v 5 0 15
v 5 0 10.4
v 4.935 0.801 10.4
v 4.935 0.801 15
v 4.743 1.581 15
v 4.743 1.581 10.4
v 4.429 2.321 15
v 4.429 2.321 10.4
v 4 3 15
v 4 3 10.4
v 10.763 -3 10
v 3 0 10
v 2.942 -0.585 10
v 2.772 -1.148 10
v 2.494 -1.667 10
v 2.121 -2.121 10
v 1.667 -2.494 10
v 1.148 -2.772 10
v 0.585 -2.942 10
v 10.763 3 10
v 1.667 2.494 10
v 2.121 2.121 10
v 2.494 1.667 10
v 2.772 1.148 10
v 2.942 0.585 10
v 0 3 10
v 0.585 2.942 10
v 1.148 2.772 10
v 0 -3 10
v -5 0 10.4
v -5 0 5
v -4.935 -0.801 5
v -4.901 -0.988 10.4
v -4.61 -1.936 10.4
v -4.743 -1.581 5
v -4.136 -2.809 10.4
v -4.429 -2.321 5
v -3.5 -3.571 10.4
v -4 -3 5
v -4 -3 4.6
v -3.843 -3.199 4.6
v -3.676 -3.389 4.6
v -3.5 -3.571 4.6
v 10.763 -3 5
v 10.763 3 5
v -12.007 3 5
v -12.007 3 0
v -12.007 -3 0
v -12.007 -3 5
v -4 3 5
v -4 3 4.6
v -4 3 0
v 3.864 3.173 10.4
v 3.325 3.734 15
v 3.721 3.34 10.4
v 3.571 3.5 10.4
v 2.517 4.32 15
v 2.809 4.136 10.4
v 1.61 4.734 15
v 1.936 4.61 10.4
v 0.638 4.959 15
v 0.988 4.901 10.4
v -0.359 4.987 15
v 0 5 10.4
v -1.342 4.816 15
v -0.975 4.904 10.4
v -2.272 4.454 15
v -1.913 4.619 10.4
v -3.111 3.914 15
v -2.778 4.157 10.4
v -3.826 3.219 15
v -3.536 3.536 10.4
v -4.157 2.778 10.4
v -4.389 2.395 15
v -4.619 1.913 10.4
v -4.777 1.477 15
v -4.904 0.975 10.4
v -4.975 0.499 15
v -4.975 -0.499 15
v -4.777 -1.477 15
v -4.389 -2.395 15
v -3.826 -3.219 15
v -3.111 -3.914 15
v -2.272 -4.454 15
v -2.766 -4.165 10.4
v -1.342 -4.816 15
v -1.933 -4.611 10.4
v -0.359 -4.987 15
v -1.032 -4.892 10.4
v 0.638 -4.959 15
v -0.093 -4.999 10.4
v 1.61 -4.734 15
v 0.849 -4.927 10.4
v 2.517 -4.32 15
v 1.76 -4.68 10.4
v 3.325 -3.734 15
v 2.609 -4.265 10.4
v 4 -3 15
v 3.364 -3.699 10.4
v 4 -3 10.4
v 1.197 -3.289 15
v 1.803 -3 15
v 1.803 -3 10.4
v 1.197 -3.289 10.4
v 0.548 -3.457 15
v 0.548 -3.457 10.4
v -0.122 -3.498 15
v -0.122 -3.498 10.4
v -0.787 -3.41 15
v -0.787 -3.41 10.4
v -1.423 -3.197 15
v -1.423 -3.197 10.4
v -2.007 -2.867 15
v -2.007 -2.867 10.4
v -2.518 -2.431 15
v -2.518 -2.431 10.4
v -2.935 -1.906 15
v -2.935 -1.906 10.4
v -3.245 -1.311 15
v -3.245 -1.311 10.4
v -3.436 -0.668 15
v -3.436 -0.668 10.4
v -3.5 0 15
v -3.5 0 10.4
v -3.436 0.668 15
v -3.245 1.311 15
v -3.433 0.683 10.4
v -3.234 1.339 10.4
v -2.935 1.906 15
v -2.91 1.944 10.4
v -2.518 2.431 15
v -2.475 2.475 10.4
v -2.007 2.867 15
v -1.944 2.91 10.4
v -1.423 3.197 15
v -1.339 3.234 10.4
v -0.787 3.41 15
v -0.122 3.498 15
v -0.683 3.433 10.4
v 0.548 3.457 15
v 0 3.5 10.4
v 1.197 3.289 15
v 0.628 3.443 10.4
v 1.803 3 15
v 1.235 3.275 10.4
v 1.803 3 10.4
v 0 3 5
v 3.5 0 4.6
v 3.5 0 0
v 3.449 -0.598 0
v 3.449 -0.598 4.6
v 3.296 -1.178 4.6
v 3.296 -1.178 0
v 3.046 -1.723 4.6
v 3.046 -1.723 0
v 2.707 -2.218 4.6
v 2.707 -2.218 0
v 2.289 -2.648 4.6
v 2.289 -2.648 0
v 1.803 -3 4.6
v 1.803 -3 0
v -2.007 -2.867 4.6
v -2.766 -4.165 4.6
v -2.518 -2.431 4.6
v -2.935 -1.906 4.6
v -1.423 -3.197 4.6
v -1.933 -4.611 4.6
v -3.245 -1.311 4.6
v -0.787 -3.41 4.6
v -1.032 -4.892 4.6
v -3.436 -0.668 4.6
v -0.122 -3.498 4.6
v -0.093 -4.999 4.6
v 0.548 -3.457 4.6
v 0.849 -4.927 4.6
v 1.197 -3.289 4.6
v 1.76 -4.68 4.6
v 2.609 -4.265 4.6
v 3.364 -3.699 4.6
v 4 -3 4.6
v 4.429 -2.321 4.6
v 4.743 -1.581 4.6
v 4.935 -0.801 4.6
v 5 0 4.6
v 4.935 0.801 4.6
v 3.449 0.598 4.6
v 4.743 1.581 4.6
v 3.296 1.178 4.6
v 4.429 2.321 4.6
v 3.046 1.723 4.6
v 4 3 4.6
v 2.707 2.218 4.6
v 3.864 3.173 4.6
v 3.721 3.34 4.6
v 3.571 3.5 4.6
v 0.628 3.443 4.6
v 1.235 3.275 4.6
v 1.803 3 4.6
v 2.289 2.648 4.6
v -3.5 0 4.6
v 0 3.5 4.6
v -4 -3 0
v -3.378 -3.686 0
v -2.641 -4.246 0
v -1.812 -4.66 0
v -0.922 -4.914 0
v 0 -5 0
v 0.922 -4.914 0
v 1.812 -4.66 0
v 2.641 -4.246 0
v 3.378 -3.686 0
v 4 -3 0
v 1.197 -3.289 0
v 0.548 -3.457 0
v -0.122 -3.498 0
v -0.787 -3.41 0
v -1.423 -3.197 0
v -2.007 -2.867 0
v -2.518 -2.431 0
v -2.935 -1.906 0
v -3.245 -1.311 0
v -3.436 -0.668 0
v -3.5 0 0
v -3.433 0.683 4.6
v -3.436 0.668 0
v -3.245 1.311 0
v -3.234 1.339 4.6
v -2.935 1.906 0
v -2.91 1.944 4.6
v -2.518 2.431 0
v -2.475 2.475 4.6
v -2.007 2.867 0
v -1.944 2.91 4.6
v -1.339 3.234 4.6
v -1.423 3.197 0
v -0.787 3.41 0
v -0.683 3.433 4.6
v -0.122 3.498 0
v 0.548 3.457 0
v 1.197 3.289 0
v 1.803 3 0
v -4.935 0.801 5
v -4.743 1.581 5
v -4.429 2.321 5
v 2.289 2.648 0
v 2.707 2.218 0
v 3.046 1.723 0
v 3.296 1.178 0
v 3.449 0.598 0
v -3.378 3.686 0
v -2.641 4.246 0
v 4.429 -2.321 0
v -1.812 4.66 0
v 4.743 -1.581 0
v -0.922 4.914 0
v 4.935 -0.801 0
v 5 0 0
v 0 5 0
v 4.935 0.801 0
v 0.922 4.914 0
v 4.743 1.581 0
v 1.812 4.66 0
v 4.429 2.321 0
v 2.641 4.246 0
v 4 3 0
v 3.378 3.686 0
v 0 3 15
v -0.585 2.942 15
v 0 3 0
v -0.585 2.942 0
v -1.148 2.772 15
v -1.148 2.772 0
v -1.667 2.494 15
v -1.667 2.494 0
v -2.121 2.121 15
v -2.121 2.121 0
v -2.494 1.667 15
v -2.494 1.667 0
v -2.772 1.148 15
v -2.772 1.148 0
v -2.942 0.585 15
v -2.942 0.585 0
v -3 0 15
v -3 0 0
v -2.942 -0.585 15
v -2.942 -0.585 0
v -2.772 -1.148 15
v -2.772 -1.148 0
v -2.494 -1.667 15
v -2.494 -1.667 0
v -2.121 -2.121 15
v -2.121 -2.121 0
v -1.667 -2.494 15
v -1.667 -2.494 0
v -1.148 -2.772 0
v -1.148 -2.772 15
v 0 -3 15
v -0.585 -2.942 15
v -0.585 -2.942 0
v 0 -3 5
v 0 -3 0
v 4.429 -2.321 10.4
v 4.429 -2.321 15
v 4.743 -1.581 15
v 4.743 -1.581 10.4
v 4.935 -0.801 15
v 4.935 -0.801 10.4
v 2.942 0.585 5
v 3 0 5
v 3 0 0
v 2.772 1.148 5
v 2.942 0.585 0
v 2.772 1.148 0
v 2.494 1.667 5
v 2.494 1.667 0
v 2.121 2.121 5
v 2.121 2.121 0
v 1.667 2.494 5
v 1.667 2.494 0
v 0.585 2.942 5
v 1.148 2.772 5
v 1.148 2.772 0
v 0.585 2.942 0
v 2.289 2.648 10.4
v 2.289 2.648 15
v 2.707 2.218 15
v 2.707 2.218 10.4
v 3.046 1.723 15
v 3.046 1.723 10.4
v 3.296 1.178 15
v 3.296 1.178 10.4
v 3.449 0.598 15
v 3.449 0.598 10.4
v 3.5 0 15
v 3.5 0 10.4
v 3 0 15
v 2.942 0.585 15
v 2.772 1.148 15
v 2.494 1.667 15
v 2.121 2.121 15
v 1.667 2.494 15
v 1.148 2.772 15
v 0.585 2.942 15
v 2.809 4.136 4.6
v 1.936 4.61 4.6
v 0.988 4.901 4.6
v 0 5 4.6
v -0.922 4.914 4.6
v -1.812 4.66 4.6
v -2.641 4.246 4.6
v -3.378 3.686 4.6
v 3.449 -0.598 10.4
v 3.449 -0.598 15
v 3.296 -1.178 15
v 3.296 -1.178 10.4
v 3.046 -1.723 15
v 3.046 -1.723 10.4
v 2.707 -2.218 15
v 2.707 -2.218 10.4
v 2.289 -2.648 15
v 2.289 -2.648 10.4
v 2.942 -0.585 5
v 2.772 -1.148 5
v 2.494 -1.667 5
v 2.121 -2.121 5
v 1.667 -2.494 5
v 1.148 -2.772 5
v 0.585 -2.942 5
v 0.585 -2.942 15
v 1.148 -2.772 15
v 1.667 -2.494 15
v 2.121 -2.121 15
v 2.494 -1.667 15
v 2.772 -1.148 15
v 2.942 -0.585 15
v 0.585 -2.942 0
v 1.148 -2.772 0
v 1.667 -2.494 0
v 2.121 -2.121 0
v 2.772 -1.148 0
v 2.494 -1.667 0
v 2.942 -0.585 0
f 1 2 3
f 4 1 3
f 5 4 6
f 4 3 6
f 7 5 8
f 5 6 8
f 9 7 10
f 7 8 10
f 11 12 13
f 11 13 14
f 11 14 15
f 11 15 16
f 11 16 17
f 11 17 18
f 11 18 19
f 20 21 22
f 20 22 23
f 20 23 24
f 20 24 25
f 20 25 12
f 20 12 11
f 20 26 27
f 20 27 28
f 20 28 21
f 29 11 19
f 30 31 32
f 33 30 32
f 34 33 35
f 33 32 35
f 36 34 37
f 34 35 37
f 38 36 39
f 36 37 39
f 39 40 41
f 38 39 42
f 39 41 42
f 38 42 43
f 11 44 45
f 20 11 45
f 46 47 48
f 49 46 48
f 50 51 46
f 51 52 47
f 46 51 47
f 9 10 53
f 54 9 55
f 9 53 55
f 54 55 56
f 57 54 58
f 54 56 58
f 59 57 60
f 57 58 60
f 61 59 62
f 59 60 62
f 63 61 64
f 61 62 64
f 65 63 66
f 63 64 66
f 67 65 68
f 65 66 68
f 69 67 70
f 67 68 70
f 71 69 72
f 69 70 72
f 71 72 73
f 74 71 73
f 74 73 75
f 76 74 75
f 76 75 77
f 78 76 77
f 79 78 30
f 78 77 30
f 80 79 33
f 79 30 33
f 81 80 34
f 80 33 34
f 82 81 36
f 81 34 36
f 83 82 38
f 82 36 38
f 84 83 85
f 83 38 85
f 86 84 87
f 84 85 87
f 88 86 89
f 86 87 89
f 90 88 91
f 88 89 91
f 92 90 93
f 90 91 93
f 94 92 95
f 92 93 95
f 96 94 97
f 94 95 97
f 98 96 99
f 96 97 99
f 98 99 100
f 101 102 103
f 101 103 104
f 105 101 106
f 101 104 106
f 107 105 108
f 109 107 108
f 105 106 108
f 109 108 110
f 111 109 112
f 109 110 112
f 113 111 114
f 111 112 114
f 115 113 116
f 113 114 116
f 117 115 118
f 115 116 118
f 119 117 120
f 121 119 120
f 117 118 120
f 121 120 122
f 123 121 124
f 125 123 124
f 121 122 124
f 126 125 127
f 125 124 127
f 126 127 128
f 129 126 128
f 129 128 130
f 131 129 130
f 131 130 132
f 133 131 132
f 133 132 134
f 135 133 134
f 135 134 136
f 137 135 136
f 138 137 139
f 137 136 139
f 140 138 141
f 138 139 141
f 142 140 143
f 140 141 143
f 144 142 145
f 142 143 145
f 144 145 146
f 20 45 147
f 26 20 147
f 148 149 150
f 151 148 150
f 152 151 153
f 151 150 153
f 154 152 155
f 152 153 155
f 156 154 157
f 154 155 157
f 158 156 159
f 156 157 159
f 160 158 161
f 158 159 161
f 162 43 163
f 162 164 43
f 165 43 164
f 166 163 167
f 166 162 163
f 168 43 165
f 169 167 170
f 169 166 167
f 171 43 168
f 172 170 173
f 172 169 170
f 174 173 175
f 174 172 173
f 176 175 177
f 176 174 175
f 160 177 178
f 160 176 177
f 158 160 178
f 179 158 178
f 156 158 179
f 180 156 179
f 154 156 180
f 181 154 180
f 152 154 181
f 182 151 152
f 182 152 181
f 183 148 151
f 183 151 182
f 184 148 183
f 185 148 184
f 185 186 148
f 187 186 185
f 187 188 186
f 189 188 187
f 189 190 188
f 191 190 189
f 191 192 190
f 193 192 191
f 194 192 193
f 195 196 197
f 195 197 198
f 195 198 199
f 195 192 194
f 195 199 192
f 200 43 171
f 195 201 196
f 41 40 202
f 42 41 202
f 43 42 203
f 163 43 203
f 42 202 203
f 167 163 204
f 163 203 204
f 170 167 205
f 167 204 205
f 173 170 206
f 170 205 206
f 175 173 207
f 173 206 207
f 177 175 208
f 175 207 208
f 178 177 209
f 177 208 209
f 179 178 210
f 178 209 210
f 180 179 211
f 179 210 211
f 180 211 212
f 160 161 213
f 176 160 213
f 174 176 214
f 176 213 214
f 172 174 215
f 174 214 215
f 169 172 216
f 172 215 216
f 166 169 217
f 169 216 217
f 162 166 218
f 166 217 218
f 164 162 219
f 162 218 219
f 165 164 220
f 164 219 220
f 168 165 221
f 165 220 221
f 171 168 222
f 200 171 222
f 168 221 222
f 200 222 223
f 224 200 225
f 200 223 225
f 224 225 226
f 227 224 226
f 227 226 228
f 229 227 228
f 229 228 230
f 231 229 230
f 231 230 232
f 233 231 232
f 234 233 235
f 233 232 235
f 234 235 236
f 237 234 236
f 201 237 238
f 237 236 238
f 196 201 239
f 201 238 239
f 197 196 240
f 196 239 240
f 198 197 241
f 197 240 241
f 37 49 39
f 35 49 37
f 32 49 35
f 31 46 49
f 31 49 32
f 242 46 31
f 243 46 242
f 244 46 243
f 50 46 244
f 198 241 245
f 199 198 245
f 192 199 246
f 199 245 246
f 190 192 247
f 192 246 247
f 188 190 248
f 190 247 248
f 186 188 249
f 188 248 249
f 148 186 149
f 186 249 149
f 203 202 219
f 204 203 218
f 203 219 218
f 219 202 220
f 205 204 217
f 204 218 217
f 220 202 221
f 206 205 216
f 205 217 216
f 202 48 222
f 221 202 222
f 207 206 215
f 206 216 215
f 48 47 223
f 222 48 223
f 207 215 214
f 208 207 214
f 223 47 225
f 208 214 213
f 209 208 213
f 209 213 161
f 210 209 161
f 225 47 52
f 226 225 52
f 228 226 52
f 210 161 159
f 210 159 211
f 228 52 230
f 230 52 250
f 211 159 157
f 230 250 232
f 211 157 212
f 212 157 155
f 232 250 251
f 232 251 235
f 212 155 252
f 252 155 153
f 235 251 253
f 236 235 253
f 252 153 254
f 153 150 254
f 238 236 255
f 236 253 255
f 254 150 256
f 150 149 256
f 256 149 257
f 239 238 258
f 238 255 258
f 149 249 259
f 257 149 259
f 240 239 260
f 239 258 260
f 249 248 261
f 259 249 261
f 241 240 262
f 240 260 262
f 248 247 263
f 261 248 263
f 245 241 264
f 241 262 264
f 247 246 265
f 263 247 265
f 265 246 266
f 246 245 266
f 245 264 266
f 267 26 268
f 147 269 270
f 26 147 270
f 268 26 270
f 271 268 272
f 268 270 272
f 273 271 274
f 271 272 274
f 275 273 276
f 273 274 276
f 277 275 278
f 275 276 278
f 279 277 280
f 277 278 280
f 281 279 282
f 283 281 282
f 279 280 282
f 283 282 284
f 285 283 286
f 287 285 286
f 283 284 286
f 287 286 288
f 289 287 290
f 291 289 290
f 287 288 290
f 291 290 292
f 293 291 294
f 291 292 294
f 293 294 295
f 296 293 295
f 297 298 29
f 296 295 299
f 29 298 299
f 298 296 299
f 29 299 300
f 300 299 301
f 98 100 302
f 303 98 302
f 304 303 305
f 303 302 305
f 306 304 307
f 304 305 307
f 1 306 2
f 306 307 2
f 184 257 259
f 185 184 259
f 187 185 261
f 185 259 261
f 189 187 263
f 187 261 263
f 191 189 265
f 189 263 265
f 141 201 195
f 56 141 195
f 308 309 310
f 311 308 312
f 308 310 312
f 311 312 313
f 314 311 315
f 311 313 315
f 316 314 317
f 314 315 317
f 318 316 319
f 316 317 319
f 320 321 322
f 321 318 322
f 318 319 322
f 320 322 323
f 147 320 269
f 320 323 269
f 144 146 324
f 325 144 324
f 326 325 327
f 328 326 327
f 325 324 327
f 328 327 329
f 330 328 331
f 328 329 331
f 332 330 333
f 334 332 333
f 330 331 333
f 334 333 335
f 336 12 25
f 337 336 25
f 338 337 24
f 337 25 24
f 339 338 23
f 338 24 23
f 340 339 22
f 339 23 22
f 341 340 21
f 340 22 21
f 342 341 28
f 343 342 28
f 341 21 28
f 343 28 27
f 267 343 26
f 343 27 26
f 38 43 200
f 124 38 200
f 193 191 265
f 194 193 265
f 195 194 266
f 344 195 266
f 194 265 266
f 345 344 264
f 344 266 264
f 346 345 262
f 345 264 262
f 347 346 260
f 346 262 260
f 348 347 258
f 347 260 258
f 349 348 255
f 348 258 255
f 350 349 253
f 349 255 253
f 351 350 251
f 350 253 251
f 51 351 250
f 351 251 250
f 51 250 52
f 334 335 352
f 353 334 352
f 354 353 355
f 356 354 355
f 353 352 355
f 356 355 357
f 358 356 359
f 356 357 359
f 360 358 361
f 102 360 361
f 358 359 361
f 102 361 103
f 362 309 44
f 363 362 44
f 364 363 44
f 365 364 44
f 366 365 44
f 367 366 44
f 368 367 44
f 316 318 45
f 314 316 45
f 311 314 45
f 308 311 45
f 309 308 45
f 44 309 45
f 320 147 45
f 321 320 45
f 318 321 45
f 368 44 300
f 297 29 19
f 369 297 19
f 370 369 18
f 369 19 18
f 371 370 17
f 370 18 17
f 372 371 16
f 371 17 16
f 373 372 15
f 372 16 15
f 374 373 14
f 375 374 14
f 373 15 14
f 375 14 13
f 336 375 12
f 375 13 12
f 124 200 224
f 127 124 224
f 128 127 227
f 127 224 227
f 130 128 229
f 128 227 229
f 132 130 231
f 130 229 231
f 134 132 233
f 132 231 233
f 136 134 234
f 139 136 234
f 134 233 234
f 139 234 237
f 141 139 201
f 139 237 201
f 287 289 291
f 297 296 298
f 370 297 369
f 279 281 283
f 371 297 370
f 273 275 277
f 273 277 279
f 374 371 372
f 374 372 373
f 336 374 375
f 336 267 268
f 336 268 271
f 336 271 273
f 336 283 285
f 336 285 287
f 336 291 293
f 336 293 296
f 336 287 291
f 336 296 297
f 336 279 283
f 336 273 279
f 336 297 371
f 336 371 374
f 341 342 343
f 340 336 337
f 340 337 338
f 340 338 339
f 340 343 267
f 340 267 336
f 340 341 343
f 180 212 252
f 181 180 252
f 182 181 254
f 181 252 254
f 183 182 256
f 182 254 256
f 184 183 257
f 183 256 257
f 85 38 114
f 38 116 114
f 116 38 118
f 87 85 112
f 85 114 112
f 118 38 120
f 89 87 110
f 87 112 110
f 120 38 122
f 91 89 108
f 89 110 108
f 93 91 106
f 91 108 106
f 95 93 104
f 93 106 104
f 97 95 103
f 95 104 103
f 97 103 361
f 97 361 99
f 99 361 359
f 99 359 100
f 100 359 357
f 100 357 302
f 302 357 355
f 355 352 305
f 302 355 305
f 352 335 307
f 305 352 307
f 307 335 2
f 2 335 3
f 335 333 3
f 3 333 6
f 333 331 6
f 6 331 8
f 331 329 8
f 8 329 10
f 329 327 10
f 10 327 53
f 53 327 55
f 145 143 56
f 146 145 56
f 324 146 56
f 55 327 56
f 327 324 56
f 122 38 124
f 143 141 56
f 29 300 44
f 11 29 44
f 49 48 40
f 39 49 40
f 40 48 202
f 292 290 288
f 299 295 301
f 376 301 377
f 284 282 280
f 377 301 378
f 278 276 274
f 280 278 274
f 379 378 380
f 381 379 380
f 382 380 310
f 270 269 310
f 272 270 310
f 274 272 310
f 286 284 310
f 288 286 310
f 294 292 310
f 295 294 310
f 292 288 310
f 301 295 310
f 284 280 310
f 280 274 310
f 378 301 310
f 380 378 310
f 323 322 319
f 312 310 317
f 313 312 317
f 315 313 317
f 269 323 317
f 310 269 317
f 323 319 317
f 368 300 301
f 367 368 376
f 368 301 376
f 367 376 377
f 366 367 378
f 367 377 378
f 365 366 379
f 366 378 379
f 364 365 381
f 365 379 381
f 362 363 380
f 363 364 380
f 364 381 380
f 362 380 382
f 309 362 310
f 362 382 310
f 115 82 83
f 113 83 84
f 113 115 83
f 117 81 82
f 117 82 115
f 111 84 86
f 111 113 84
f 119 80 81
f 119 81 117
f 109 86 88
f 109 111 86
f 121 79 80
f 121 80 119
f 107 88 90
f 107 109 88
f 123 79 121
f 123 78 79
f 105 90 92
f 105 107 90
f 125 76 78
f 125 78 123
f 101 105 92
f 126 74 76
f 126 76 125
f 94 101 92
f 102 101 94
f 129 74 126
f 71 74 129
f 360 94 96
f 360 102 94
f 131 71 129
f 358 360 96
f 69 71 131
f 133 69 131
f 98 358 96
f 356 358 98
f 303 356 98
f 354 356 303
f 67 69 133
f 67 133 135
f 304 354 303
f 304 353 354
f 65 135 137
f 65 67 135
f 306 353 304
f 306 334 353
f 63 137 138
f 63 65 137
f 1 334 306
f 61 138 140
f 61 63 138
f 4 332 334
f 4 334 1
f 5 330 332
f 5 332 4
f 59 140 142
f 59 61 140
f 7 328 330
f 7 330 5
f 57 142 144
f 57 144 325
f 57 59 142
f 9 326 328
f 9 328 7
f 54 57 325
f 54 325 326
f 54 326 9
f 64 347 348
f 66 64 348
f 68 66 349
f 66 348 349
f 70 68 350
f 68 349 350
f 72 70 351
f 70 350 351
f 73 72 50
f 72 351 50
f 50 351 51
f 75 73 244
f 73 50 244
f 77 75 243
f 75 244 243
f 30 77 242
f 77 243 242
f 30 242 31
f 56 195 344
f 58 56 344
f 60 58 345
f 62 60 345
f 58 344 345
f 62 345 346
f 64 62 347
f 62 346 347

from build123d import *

# Parameters (mm, degrees)
F1_DEPTH = 15
F2_START = 5
F2_DEPTH = 5
F3_DEPTH = 4.6
F5_DEPTH = 5.8
F6_START = 10.4
F6_DEPTH = 4.6
F7_DEPTH = 5


with BuildPart() as f1:
    # F0 (on Top) → F1 (new body)
    with BuildSketch(Plane.XY):
        with BuildLine():
            ThreePointArc((0, -3), (2.1213203436, -2.1213203436), (3, 0))
            ThreePointArc((3, 0), (2.1213203436, 2.1213203436), (0, 3))
            ThreePointArc((0, 3), (-3, 0), (0, -3))
        make_face()
    extrude(amount=F1_DEPTH)

    # F0 (on Top) → F2 (join)
    with BuildSketch(Plane.XY.offset(F2_START)):
        with BuildLine():
            Line((10.7628116384, 3), (4, 3))
            ThreePointArc((4, 3), (4.7434164903, 1.5811388301), (5, 0))
            ThreePointArc((5, 0), (4.7434164903, -1.5811388301), (4, -3))
            Line((4, -3), (10.7628116384, -3))
            Line((10.7628116384, -3), (10.7628116384, 3))
        make_face()
        with BuildLine():
            ThreePointArc((0, 3), (2.1213203436, 2.1213203436), (3, 0))
            ThreePointArc((3, 0), (2.1213203436, -2.1213203436), (0, -3))
            Line((0, -3), (1.8027756377, -3))
            ThreePointArc((1.8027756377, -3), (3.0462858313, -1.7234101758), (3.5, 0))
            ThreePointArc((3.5, 0), (3.0462858313, 1.7234101758), (1.8027756377, 3))
            Line((1.8027756377, 3), (0, 3))
        make_face()
        with BuildLine():
            Line((4, 3), (1.8027756377, 3))
            ThreePointArc((1.8027756377, 3), (3.0462858313, 1.7234101758), (3.5, 0))
            ThreePointArc((3.5, 0), (3.0462858313, -1.7234101758), (1.8027756377, -3))
            Line((1.8027756377, -3), (4, -3))
            ThreePointArc((4, -3), (4.7434164903, -1.5811388301), (5, 0))
            ThreePointArc((5, 0), (4.7434164903, 1.5811388301), (4, 3))
        make_face()
    extrude(amount=F2_DEPTH)


with BuildPart() as f3:
    # F0 (on Top) → F3 (new body)
    with BuildSketch(Plane.XY):
        with BuildLine():
            ThreePointArc((1.8027756377, -3), (-3.5, 0), (1.8027756377, 3))
            Line((1.8027756377, 3), (4, 3))
            ThreePointArc((4, 3), (0, 5), (-4, 3))
            ThreePointArc((-4, 3), (-5, 0), (-4, -3))
            ThreePointArc((-4, -3), (0, -5), (4, -3))
            Line((4, -3), (1.8027756377, -3))
        make_face()
        with BuildLine():
            Line((4, 3), (1.8027756377, 3))
            ThreePointArc((1.8027756377, 3), (3.0462858313, 1.7234101758), (3.5, 0))
            ThreePointArc((3.5, 0), (3.0462858313, -1.7234101758), (1.8027756377, -3))
            Line((1.8027756377, -3), (4, -3))
            ThreePointArc((4, -3), (4.7434164903, -1.5811388301), (5, 0))
            ThreePointArc((5, 0), (4.7434164903, 1.5811388301), (4, 3))
        make_face()
    extrude(amount=F3_DEPTH)

    # F4 (on face) → F5 (join)
    with BuildSketch(Plane.XY.offset(4.6)):
        with BuildLine():
            Line((-3.5, 0), (-5, 0))
            ThreePointArc((-5, 0), (-4.6097722286, -1.9364916731), (-3.5, -3.5707142143))
            Line((-3.5, -3.5707142143), (-3.5, 0))
        make_face()
        with BuildLine():
            Line((0, 3.5), (0, 5))
            ThreePointArc((0, 5), (-3.5355339059, 3.5355339059), (-5, 0))
            Line((-5, 0), (-3.5, 0))
            ThreePointArc((-3.5, 0), (-2.4748737342, 2.4748737342), (0, 3.5))
        make_face()
        with BuildLine():
            ThreePointArc((3.5707142143, 3.5), (1.9364916731, 4.6097722286), (0, 5))
            Line((0, 5), (0, 3.5))
            Line((0, 3.5), (3.5707142143, 3.5))
        make_face()
    extrude(amount=F5_DEPTH)

    # F0 (on Top) → F6 (join)
    with BuildSketch(Plane.XY.offset(F6_START)):
        with BuildLine():
            ThreePointArc((1.8027756377, -3), (-3.5, 0), (1.8027756377, 3))
            Line((1.8027756377, 3), (4, 3))
            ThreePointArc((4, 3), (0, 5), (-4, 3))
            ThreePointArc((-4, 3), (-5, 0), (-4, -3))
            ThreePointArc((-4, -3), (0, -5), (4, -3))
            Line((4, -3), (1.8027756377, -3))
        make_face()
        with BuildLine():
            Line((4, 3), (1.8027756377, 3))
            ThreePointArc((1.8027756377, 3), (3.0462858313, 1.7234101758), (3.5, 0))
            ThreePointArc((3.5, 0), (3.0462858313, -1.7234101758), (1.8027756377, -3))
            Line((1.8027756377, -3), (4, -3))
            ThreePointArc((4, -3), (4.7434164903, -1.5811388301), (5, 0))
            ThreePointArc((5, 0), (4.7434164903, 1.5811388301), (4, 3))
        make_face()
    extrude(amount=F6_DEPTH)

    # F0 (on Top) → F7 (join)
    with BuildSketch(Plane.XY):
        with BuildLine():
            ThreePointArc((-4, -3), (-5, 0), (-4, 3))
            Line((-4, 3), (-12.0067028329, 3))
            Line((-12.0067028329, 3), (-12.0067028329, -3))
            Line((-12.0067028329, -3), (-4, -3))
        make_face()
    extrude(amount=F7_DEPTH)


solid = Compound([f1.part, f3.part])
